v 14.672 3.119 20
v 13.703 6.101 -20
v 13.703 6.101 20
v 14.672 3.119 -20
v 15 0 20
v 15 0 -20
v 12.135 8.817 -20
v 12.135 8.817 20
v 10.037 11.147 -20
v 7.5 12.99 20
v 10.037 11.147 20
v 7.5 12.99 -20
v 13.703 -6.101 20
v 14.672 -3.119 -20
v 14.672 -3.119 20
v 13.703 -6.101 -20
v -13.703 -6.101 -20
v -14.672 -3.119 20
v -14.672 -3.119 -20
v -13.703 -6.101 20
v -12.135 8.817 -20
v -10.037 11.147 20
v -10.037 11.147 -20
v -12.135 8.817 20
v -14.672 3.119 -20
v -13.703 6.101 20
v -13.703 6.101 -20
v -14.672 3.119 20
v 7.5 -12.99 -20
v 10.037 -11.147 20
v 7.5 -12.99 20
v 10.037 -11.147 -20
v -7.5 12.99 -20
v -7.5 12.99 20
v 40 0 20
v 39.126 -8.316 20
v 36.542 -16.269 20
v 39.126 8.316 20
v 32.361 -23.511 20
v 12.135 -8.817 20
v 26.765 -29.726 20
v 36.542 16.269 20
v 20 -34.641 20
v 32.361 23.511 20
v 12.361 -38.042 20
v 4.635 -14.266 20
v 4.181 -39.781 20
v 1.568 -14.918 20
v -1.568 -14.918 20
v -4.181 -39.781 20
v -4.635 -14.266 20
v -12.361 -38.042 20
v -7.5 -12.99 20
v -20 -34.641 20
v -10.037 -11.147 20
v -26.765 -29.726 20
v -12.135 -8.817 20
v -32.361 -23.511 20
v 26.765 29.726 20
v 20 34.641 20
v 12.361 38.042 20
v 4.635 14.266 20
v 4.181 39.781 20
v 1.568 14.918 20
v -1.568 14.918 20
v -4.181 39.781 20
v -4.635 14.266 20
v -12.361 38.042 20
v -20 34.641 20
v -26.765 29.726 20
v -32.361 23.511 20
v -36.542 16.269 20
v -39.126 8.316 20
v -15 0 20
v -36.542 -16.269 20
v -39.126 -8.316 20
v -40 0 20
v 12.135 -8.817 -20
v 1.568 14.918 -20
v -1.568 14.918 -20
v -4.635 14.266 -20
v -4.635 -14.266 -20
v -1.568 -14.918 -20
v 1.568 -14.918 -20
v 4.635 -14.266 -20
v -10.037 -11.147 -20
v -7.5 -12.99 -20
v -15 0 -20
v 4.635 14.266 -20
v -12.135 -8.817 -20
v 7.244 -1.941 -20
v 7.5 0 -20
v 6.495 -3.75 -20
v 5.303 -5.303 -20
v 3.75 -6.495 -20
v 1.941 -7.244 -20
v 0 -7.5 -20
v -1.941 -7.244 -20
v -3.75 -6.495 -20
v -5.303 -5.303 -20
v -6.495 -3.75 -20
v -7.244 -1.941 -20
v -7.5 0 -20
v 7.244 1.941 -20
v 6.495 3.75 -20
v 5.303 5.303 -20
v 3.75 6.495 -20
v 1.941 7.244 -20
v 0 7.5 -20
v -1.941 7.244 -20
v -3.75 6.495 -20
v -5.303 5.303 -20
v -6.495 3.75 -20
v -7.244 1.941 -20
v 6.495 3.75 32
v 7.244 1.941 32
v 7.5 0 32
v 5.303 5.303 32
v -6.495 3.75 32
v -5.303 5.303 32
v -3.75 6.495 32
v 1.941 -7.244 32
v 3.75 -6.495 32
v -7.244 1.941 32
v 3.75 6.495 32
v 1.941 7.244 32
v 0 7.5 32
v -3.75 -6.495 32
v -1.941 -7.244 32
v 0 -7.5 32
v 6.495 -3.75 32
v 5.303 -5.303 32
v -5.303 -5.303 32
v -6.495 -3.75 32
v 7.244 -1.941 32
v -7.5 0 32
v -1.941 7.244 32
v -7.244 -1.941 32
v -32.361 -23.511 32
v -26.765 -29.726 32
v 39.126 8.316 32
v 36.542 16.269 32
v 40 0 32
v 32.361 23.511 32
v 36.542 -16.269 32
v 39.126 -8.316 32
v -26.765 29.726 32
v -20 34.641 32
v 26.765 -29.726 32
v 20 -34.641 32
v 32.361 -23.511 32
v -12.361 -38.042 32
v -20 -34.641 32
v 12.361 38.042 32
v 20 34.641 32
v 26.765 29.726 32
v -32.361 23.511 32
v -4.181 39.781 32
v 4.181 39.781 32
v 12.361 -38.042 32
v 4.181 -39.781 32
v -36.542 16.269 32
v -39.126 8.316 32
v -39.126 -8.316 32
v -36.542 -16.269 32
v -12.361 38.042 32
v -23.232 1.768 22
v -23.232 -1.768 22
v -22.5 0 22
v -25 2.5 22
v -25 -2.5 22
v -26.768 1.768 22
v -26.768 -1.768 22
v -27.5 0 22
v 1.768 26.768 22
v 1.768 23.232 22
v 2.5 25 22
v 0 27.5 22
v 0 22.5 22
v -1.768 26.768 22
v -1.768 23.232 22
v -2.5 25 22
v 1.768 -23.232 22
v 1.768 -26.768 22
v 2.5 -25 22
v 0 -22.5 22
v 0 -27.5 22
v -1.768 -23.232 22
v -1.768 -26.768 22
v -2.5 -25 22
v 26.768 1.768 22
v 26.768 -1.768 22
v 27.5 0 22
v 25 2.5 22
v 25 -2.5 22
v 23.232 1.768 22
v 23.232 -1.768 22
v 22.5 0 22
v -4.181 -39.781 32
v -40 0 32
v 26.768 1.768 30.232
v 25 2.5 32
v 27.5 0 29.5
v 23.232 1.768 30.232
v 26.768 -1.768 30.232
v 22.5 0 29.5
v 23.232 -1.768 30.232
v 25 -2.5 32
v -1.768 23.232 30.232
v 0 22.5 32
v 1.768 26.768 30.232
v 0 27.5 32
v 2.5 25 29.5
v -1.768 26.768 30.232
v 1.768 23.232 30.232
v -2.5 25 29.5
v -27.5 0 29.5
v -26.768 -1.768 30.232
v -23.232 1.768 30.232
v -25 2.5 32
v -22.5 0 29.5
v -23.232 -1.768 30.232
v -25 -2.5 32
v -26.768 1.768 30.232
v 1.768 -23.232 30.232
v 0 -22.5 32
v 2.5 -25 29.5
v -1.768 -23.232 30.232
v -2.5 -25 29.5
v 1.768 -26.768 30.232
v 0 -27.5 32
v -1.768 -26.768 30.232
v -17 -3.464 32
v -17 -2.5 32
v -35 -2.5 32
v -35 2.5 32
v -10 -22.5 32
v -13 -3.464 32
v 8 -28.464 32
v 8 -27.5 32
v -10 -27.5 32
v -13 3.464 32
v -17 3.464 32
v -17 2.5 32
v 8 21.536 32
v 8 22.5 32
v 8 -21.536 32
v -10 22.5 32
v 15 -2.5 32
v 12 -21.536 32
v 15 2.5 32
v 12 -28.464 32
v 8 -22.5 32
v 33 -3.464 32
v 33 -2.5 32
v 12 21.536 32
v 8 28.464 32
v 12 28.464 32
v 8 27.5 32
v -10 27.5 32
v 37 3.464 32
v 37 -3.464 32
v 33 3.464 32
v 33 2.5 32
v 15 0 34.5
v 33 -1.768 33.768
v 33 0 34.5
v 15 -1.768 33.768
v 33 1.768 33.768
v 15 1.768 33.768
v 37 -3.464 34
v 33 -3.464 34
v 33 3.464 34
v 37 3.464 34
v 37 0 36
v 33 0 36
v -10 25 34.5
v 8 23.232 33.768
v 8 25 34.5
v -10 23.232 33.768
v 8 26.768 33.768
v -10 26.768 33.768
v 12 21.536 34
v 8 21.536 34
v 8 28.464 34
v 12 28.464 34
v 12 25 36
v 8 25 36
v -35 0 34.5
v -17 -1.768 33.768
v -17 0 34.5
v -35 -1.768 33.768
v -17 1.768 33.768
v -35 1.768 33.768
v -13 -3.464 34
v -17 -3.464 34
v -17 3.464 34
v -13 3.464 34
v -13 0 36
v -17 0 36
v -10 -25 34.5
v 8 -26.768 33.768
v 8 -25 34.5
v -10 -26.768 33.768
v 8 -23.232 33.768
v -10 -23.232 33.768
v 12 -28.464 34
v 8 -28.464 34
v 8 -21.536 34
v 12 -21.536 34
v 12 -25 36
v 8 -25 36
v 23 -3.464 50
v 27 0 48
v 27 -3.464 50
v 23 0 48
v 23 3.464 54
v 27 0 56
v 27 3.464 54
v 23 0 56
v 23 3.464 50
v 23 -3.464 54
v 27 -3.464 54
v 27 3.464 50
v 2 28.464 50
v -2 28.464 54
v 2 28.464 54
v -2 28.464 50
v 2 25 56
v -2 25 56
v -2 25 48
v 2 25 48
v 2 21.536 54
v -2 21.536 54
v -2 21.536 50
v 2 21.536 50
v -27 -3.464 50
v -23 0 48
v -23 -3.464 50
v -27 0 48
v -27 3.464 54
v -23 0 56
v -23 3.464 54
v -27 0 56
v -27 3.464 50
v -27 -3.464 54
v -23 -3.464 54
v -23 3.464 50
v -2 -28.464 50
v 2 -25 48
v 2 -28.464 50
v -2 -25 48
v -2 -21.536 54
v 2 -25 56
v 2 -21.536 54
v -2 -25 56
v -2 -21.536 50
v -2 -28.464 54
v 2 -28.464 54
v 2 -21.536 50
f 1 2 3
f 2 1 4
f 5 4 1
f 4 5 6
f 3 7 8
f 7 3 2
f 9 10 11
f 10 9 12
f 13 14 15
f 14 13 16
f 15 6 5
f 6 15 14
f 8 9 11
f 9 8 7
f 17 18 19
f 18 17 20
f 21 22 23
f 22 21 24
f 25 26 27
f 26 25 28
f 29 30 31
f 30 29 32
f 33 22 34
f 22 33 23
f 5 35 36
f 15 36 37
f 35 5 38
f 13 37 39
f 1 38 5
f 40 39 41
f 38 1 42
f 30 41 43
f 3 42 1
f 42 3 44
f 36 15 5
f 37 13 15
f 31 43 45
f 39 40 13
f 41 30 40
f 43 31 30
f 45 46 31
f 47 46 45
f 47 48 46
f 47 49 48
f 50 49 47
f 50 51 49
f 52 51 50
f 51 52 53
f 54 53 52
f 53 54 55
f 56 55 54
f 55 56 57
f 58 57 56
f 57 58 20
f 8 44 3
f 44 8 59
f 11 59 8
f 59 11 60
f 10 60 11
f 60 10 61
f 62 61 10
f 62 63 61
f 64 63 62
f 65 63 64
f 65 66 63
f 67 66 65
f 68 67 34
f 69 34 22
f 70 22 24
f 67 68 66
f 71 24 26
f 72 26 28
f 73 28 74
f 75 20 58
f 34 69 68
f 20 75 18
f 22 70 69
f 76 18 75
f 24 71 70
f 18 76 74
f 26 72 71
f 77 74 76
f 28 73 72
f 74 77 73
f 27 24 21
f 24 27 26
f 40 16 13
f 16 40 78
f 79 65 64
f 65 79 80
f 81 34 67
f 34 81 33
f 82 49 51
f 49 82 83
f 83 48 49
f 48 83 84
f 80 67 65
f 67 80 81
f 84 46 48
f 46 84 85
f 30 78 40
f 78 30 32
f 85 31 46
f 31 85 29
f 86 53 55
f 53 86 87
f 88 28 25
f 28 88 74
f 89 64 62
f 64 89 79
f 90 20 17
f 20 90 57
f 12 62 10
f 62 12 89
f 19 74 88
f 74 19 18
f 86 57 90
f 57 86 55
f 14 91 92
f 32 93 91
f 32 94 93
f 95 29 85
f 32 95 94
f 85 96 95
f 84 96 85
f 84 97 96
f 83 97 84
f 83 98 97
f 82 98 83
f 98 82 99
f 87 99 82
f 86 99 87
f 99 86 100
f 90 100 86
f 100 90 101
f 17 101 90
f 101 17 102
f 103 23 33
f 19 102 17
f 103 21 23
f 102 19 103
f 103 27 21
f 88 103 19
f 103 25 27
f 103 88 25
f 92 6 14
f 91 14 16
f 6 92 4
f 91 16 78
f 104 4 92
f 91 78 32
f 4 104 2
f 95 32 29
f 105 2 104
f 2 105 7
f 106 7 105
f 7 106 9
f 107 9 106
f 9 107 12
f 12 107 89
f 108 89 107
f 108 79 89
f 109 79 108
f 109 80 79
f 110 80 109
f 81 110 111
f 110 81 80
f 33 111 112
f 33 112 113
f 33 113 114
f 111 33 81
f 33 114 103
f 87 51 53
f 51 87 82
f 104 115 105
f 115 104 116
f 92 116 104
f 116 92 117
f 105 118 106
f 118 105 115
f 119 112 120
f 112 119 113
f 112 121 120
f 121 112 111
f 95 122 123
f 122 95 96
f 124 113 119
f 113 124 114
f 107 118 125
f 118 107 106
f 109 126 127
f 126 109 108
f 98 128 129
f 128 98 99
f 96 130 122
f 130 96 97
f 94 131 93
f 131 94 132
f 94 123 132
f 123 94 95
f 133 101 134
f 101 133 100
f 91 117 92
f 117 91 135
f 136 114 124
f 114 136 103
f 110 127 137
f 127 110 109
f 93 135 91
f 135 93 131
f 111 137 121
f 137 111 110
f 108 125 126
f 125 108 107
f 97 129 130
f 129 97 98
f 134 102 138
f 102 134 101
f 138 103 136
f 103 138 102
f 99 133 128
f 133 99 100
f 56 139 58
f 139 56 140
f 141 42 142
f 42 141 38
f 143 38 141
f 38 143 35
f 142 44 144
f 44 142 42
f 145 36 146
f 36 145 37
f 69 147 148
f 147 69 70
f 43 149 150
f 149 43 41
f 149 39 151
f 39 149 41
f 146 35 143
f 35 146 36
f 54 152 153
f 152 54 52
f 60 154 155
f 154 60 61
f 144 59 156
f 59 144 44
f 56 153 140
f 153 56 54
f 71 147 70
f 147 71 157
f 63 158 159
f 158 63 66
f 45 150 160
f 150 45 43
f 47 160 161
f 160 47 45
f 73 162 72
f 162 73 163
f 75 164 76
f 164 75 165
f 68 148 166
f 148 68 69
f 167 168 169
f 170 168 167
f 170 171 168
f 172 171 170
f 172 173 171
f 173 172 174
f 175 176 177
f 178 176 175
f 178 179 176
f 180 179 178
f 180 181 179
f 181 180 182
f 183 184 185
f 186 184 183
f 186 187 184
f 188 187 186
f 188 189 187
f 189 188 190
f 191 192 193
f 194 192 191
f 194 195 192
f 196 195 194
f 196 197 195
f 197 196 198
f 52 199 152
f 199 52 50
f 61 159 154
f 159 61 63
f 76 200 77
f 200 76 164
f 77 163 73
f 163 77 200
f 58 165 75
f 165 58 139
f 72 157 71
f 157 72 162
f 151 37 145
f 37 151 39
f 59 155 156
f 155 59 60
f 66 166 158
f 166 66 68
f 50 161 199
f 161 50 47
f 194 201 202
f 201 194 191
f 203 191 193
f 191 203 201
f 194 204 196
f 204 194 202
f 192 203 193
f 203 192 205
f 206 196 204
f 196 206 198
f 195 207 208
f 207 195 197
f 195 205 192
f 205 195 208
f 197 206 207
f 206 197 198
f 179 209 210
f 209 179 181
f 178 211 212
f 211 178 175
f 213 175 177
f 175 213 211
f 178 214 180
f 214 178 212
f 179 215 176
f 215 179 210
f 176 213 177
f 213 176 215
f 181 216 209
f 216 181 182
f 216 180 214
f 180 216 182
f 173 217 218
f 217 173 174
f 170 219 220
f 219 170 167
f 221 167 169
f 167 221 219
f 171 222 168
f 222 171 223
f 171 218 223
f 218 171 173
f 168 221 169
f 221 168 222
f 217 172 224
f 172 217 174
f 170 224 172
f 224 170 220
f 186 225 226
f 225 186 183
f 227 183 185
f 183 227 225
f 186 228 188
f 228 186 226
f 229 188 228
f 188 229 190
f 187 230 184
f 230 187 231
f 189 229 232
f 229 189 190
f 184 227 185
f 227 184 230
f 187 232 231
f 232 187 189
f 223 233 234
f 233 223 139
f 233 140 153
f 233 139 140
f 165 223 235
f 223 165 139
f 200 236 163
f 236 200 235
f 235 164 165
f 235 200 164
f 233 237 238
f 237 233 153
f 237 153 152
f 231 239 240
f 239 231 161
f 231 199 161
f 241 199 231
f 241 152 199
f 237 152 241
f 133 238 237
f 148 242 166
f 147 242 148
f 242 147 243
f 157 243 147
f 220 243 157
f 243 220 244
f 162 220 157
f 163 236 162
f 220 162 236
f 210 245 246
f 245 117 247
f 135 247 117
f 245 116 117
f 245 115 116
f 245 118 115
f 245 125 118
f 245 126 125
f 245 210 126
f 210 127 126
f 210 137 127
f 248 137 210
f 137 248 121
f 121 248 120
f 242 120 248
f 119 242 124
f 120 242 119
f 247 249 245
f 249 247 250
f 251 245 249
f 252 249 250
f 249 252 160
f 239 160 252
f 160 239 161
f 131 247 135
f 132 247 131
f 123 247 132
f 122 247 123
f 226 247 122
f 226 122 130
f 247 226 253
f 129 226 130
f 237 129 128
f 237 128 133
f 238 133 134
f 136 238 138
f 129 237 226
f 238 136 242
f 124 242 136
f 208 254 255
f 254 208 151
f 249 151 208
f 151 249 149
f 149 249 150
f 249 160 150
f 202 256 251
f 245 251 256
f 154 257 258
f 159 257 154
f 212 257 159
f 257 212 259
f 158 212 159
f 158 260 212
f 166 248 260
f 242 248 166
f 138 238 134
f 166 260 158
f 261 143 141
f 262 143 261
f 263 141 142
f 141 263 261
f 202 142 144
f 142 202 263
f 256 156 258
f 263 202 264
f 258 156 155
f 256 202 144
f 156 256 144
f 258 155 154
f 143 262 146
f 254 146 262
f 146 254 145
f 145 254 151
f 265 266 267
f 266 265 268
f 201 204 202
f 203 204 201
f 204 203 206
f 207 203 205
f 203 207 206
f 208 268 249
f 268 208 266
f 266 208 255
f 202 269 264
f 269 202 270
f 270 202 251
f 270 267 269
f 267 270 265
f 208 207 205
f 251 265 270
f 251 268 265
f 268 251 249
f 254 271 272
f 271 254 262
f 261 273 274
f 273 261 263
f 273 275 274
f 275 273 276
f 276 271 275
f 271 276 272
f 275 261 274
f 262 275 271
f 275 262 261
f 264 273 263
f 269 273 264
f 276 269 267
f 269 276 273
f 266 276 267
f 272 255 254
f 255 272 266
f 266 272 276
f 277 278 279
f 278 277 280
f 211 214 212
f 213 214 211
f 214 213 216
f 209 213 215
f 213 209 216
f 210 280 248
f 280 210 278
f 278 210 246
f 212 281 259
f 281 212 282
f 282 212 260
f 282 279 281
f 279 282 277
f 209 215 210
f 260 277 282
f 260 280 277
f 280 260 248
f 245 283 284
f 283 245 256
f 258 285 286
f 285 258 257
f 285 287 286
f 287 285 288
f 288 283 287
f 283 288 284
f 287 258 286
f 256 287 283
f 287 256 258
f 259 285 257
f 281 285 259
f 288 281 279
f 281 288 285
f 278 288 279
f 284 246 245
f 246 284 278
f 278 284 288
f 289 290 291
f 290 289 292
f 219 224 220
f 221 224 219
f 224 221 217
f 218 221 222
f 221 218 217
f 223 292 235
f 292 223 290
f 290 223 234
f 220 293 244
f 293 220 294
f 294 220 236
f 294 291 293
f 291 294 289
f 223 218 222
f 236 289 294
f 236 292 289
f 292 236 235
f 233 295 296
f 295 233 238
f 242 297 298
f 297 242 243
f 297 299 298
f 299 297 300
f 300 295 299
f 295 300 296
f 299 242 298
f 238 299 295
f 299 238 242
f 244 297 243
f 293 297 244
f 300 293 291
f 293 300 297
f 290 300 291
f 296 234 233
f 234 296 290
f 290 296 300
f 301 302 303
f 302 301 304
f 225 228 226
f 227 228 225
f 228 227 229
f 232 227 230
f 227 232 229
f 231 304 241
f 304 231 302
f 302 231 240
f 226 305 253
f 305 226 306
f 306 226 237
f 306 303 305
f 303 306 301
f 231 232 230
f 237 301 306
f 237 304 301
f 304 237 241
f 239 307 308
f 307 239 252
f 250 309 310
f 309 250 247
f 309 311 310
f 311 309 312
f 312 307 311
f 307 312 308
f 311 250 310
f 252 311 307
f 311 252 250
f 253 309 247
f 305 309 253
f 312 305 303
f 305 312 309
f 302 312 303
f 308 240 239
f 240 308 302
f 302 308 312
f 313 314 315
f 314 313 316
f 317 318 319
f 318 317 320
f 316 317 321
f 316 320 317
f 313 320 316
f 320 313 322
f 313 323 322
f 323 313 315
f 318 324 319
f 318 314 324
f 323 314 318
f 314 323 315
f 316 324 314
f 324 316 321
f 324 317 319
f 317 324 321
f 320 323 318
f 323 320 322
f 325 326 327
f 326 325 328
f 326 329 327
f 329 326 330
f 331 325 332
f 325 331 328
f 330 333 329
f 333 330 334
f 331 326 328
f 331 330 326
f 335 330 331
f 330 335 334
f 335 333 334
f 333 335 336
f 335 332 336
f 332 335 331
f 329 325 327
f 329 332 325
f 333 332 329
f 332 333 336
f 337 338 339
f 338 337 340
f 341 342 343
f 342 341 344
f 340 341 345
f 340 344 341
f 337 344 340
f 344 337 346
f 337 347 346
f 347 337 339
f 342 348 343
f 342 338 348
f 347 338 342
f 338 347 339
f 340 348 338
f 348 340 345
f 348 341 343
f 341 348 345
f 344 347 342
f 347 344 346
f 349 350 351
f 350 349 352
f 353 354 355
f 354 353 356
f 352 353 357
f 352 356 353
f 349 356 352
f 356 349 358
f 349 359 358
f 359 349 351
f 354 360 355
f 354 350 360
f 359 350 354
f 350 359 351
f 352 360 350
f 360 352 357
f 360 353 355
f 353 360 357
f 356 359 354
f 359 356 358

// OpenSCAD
// Parameters
hub_diameter = 30;
hub_length = 40;
shaft_hole_diameter = 15;
flange_diameter = 80;
flange_thickness = 10;
spacer_thickness = 2;
bolt_hole_diameter = 5;
bolt_diameter = 5;
bolt_length = 20;
nut_size = 8;
bolt_count = 4;
bolt_circle_diameter = 50;

// Hub with bolt holes
module hub() {
    difference() {
        cylinder(d=hub_diameter, h=hub_length, center=true);
        cylinder(d=shaft_hole_diameter, h=hub_length + 2, center=true);
        
        // Adding bolt holes on the hub
        for (i = [0:bolt_count-1]) {
            angle = i * 360 / bolt_count;
            translate([bolt_circle_diameter/2 * cos(angle), bolt_circle_diameter/2 * sin(angle), 0])
                cylinder(d=bolt_hole_diameter, h=hub_length + 2, center=true);
        }
    }
}

// Flange Plate with bolt holes
module flange_plate() {
    difference() {
        cylinder(d=flange_diameter, h=flange_thickness, center=true);
        cylinder(d=shaft_hole_diameter, h=flange_thickness + 2, center=true);
        
        for (i = [0:bolt_count-1]) {
            angle = i * 360 / bolt_count;
            translate([bolt_circle_diameter/2 * cos(angle), bolt_circle_diameter/2 * sin(angle), 0])
                cylinder(d=bolt_hole_diameter, h=flange_thickness + 2, center=true);
        }
    }
}

// Spacer Ring
module spacer_ring() {
    difference() {
        cylinder(d=flange_diameter, h=spacer_thickness, center=true);
        cylinder(d=shaft_hole_diameter, h=spacer_thickness + 2, center=true);
    }
}

// Bolt with hexagonal head
module bolt() {
    union() {
        cylinder(d=bolt_diameter, h=bolt_length, center=true);
        translate([0, 0, bolt_length/2])
            cylinder(d=nut_size, h=nut_size/2, center=true, $fn=6);
    }
}

// Nut
module nut() {
    cylinder(d=nut_size, h=nut_size/2, center=true, $fn=6);
}

// Assembly
module coupling_assembly() {
    hub();
    translate([0, 0, hub_length/2 + spacer_thickness/2])
        spacer_ring();
    translate([0, 0, hub_length/2 + spacer_thickness + flange_thickness/2])
        flange_plate();
    
    for (i = [0:bolt_count-1]) {
        angle = i * 360 / bolt_count;
        translate([bolt_circle_diameter/2 * cos(angle), bolt_circle_diameter/2 * sin(angle), hub_length/2 + spacer_thickness + flange_thickness])
            rotate([0, 90, 0])
                bolt();
        translate([bolt_circle_diameter/2 * cos(angle), bolt_circle_diameter/2 * sin(angle), hub_length/2 + spacer_thickness + flange_thickness + bolt_length])
            rotate([0, 90, 0])
                nut();
    }
}

// Render the coupling assembly
coupling_assembly();
